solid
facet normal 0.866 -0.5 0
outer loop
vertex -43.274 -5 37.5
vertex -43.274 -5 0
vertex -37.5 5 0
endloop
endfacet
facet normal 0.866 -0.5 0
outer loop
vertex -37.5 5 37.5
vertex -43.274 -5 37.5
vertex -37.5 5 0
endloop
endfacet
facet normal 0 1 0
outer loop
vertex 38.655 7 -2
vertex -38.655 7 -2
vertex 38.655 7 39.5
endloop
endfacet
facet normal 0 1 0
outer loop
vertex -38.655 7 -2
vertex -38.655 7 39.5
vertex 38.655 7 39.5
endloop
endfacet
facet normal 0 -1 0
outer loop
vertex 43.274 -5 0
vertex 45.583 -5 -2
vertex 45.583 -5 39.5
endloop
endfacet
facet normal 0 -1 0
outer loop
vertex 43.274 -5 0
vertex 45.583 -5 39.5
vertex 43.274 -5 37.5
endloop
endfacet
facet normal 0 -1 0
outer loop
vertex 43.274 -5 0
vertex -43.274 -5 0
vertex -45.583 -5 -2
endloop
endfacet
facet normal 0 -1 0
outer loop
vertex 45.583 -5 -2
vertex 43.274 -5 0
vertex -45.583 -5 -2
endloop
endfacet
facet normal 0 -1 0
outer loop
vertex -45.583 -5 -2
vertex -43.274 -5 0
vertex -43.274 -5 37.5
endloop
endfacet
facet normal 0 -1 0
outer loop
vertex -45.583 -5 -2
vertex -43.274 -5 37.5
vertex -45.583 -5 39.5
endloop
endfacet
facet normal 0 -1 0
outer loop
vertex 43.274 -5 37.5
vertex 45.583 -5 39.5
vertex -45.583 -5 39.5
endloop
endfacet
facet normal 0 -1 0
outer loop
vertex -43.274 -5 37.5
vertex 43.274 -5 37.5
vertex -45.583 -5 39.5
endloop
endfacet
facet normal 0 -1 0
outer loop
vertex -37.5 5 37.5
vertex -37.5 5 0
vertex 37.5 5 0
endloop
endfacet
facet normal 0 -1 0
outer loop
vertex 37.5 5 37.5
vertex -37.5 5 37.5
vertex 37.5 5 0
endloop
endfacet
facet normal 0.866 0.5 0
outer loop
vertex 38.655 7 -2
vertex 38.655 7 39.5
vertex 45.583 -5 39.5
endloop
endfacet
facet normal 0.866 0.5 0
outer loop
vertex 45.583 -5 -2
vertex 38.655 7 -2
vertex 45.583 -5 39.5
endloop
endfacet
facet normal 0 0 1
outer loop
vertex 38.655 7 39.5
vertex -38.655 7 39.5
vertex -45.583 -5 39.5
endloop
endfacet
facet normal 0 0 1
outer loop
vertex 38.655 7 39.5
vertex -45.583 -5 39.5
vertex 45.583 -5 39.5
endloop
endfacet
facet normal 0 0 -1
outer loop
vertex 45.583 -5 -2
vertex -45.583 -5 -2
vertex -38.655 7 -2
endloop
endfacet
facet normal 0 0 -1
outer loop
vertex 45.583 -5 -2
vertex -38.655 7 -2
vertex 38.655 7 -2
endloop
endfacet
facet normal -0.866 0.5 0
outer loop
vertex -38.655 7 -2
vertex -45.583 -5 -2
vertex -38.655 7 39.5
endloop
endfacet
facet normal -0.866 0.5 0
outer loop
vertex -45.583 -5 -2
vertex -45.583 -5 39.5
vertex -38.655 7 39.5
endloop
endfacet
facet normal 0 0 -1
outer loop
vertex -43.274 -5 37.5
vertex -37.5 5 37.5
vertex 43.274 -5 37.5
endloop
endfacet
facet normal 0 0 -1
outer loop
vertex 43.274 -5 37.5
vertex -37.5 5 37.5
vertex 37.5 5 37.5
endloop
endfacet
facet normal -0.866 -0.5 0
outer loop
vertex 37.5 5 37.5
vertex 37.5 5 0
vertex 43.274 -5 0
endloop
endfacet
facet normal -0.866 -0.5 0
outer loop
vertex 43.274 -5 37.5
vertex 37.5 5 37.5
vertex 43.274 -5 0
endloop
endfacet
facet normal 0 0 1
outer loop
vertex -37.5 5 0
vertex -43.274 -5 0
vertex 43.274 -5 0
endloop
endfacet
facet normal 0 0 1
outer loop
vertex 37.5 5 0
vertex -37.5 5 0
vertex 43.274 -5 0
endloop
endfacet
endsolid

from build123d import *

# Parameters (mm, degrees)
F1_DEPTH = 37.5
F3_DEPTH = 2
F5_DEPTH = 2


with BuildPart() as f1:
    # F0 (on Top) → F1 (new body)
    with BuildSketch(Plane.XY):
        Polygon((-43.273503, -5), (-37.5, 5), (37.5, 5), (43.273503, -5), (45.582904, -5), (38.654701, 7), (-38.654701, 7), (-45.582904, -5), align=None)
    extrude(amount=F1_DEPTH)

    # F2 (on face) → F3 (join)
    with BuildSketch(Plane.XY.offset(37.5)):
        Polygon((-38.654701, 7), (-45.582904, -5), (-43.273503, -5), (-37.5, 5), (37.5, 5), (43.273503, -5), (45.582904, -5), (38.654701, 7), align=None)
        Polygon((-37.5, 5), (-43.273503, -5), (43.273503, -5), (37.5, 5), align=None)
    extrude(amount=F3_DEPTH)

    # F4 (on face) → F5 (join)
    with BuildSketch(Plane(origin=(0, 0, 0), x_dir=(1, 0, 0), z_dir=(0, 0, -1))):
        Polygon((45.582904, 5), (-45.582904, 5), (-38.654701, -7), (38.654701, -7), align=None)
    extrude(amount=F5_DEPTH)


solid = f1.part
